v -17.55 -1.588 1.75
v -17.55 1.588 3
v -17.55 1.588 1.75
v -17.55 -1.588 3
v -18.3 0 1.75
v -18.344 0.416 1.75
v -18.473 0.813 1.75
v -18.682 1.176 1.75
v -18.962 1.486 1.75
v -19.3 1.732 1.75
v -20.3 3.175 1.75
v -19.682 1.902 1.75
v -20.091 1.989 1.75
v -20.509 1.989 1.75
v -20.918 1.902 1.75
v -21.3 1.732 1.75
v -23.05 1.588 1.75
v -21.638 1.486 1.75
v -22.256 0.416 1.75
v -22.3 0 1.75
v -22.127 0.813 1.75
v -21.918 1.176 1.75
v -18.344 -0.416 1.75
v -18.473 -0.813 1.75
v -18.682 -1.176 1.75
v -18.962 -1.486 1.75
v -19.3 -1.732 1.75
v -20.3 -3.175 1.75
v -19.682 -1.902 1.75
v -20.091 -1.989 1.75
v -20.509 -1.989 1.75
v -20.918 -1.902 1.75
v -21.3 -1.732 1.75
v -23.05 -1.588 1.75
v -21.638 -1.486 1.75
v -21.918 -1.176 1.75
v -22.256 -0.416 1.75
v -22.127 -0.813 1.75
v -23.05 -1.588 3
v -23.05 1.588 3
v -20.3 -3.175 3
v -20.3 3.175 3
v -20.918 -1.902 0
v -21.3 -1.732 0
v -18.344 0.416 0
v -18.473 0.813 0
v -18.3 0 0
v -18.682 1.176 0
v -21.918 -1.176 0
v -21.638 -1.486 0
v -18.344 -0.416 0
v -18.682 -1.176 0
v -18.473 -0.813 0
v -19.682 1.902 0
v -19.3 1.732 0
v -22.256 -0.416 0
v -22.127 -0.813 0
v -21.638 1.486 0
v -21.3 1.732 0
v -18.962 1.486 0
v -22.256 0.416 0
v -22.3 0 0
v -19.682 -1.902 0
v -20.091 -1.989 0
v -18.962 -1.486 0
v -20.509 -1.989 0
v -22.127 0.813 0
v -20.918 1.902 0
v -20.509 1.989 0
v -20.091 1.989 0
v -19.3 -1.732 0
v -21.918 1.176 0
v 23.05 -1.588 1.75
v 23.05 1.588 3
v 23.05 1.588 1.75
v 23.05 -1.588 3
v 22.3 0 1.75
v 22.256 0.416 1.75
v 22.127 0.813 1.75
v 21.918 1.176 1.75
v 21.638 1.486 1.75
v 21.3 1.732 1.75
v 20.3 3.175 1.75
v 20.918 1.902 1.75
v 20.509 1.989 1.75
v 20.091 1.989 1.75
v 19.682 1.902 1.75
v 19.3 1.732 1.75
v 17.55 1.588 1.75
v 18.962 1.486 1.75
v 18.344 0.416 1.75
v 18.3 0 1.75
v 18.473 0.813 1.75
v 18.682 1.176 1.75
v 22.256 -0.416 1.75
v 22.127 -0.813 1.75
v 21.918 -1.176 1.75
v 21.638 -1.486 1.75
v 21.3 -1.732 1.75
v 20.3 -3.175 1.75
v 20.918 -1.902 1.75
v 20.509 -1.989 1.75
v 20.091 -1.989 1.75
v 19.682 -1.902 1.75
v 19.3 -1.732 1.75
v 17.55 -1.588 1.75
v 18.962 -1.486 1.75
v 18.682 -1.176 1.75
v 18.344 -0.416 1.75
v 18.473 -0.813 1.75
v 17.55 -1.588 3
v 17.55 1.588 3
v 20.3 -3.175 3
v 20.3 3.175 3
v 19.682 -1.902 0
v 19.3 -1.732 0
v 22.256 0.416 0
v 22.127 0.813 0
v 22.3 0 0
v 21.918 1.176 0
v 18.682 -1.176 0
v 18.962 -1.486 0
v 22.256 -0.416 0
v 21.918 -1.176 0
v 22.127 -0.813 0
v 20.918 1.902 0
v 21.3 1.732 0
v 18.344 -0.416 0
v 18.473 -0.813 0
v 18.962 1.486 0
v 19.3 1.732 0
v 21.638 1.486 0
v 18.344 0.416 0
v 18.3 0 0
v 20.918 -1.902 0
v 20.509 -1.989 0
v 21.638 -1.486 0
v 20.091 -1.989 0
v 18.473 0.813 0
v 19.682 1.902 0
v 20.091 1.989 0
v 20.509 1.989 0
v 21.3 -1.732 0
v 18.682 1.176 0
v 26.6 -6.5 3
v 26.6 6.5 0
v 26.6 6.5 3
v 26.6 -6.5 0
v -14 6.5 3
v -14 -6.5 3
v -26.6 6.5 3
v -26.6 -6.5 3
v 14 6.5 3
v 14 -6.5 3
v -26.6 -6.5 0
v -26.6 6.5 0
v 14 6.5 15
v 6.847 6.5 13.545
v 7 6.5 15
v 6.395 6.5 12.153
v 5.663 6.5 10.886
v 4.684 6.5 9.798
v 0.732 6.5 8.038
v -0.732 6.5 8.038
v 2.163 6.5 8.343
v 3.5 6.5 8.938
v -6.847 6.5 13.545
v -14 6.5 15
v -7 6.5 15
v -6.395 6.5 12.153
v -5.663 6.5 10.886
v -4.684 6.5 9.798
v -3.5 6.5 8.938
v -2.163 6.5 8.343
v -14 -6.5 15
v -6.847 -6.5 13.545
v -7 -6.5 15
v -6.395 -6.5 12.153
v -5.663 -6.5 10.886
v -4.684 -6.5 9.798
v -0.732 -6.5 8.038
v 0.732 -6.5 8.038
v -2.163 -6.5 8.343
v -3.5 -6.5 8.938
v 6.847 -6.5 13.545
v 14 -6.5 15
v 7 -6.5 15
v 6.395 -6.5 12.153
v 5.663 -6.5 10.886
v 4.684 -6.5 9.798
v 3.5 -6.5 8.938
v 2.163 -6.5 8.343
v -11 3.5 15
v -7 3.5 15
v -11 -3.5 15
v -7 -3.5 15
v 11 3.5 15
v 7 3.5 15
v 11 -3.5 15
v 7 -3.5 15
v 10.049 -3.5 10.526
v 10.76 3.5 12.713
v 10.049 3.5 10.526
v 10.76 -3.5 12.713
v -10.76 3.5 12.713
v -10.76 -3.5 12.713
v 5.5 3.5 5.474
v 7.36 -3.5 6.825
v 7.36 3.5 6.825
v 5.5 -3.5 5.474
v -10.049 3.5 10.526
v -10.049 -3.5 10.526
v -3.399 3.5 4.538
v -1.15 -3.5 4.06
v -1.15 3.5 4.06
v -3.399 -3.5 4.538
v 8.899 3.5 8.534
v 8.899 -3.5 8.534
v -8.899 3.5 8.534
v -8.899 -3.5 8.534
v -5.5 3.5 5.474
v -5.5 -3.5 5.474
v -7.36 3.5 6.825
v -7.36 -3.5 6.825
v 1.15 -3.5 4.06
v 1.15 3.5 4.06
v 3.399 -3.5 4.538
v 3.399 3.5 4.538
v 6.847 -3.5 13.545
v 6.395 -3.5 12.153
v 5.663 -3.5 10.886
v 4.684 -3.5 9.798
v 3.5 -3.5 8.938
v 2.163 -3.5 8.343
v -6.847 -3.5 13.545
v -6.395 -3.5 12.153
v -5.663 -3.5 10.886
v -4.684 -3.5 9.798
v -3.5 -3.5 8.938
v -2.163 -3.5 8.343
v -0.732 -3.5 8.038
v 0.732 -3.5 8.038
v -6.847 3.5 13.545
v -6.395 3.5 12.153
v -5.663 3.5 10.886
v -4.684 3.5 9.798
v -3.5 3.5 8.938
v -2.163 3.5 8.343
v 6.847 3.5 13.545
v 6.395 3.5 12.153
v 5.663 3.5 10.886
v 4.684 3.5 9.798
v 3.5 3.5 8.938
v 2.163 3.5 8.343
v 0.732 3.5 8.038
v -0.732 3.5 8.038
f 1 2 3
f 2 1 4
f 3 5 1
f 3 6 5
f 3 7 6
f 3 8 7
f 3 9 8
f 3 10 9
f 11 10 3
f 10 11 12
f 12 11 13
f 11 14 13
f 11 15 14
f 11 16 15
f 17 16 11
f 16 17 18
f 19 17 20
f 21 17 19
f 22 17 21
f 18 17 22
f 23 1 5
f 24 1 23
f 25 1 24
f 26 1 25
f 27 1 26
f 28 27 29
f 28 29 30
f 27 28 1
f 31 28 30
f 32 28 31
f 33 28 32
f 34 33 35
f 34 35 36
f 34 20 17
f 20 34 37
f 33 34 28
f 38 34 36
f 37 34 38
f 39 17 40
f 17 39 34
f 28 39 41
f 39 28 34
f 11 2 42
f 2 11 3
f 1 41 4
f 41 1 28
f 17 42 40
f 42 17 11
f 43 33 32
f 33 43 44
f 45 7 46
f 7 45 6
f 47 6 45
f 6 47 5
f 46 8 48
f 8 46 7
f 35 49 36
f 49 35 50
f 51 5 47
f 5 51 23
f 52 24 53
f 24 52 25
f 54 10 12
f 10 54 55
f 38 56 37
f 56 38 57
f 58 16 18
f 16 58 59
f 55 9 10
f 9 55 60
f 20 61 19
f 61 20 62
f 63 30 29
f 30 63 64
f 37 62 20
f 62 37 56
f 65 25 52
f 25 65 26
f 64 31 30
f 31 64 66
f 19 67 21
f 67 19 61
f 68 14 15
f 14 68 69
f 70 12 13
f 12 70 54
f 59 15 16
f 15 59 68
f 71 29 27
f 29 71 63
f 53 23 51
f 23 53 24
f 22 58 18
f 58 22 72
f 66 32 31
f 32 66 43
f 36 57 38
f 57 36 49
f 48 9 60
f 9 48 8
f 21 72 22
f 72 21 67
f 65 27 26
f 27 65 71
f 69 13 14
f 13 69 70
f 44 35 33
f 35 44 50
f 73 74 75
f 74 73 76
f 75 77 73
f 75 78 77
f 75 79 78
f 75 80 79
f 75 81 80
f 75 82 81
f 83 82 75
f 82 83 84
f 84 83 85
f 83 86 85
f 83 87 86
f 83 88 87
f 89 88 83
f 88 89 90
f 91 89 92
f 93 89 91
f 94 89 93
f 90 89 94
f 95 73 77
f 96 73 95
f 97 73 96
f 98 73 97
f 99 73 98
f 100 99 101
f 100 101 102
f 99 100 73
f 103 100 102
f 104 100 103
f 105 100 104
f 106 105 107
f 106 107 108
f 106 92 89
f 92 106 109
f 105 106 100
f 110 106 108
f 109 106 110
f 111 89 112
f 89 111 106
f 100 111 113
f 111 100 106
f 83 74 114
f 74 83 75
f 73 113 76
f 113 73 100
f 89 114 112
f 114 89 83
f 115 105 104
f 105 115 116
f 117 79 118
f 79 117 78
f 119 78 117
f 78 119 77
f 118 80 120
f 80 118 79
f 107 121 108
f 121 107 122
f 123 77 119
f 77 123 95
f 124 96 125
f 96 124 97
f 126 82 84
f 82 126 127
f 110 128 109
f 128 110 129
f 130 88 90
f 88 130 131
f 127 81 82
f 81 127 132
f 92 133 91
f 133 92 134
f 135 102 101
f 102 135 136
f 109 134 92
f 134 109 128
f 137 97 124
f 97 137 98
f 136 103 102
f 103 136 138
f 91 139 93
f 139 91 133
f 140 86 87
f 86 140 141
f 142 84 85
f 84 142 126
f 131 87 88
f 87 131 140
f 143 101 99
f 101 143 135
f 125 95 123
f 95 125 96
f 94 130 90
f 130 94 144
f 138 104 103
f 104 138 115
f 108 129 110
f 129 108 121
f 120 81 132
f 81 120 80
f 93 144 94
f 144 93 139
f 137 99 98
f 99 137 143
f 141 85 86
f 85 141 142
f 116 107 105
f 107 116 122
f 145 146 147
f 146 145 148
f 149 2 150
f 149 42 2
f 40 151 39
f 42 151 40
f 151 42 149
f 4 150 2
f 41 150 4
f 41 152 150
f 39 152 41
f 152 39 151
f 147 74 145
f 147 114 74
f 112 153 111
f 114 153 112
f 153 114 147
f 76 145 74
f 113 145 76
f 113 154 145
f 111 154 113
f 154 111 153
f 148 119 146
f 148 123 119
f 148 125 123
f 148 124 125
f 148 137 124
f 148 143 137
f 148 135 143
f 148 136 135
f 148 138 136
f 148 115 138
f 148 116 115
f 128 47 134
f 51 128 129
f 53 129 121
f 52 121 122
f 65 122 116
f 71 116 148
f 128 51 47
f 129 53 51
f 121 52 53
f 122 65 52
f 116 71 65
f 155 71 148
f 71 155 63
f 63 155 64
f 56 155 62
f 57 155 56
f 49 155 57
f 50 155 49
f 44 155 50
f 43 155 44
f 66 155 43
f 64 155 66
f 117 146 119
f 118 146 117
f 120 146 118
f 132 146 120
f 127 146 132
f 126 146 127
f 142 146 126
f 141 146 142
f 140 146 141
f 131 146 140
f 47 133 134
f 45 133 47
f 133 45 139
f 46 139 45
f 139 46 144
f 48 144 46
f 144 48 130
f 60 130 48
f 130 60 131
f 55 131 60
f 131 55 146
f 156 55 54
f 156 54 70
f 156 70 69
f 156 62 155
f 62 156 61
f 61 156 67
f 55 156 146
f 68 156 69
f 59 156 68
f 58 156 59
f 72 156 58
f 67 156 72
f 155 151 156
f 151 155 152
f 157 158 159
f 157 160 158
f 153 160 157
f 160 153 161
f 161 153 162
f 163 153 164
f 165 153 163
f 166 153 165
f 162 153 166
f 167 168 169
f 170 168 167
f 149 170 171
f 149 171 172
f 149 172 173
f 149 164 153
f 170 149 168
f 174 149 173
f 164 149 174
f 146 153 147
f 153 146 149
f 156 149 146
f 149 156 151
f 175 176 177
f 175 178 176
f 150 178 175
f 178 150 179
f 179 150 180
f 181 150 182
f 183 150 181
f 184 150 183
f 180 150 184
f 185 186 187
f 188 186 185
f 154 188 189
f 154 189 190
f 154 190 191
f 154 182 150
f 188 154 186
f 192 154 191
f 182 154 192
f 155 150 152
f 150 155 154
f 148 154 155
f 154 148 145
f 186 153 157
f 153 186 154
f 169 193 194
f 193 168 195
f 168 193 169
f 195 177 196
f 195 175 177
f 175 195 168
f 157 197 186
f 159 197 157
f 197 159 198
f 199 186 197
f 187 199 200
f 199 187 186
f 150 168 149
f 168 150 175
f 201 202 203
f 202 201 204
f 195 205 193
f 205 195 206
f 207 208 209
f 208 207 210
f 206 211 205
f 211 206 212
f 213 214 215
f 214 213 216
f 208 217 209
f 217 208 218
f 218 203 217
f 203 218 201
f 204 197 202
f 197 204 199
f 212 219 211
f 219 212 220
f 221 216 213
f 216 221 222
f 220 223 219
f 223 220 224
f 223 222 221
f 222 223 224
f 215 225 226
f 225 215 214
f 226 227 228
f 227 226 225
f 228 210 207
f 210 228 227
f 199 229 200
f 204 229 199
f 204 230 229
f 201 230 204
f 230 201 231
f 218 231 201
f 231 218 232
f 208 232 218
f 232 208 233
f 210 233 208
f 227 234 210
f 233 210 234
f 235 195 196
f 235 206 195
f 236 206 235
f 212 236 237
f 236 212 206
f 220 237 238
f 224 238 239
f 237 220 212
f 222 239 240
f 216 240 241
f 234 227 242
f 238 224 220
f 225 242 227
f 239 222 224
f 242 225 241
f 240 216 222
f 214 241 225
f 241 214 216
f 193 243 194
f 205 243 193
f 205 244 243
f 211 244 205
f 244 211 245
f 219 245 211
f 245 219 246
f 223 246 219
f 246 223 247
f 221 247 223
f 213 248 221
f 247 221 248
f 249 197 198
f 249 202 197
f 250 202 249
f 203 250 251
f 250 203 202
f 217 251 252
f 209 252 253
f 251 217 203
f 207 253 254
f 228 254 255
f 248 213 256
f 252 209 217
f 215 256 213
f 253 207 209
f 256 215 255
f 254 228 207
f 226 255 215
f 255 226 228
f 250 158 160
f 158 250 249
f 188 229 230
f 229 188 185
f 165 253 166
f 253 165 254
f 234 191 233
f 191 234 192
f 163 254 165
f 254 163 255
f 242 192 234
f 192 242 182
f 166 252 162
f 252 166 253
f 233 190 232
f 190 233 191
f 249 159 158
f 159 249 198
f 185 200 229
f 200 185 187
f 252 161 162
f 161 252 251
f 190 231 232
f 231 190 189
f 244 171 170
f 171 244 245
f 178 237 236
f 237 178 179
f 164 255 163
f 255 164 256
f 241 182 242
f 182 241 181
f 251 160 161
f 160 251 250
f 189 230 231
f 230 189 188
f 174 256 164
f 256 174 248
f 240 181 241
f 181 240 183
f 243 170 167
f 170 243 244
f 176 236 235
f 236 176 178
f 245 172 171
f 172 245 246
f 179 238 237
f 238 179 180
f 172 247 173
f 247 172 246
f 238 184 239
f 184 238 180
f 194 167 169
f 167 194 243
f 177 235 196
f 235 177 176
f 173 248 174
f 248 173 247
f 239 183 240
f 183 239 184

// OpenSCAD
// file: common.scad
/*--------------------------------------------------------------------------*
* Sizes and common routines for the CNC parts
*---------------------------------------------------------------------------*
* 13-Jul-2014 ShaneG
*
* First set of definitions using the components I have to experiment with.
*--------------------------------------------------------------------------*/

//---------------------------------------------------------------------------
// Common definitions
//---------------------------------------------------------------------------

RESOLUTION  = 0.1; // Resolution of your printer

PANEL_DEPTH = 3.0; // The prefered size of any shell material

BOLT_SIZE = 4.2; // Diameter of connecting bolts (M4)

BED_TO_MOUNT = 15.0;

GUIDE_ROD_DIAMETER = 12.50;

BEARING_DIAMETER       = 22.00;
BEARING_INNER_DIAMETER = 14.00;
BEARING_HEIGHT         = 7.00;

//---------------------------------------------------------------------------
// Nuts
//---------------------------------------------------------------------------

/* Hex Nut
**
** Dimensios for a hex nut. The 'outer' diameter (ie: straight side to
** parallel straight side) of the nut does not seem very consistent -
** measurements indicate a 0.5mm range of error across nuts.
*/

NUT_OUTER_DIAMETER = 13.00;
NUT_INNER_DIAMETER = 8.50;  // Enough room for the bore and thread
NUT_HEIGHT         = 6;

NUT4_OUTER_DIAMETER = 5.5;
NUT4_INNER_DIAMETER = 4.0;
NUT4_HEIGHT         = 2.5;

/** Create a hexagon.
 *
 * The 'length' parameter specifies the distance from the center of the
 * hexagon to the center of one of the six straight edges. The 'depth'
 * parameter specifies the size in the Z axis. The resulting object
 * is centered on the origin.
 */
module hexagon(length, depth = 2) {
  width = 2 * length * tan(30);
  union() {
    cube(size = [ length * 2, width, depth ], center = true);
    rotate(a = [ 0, 0, 60 ]) {
      cube(size = [ length * 2, width, depth ], center = true);
      }
    rotate(a = [ 0, 0, -60 ]) {
      cube(size = [ length * 2, width, depth ], center = true);
      }
    }
  }

/** Create a hex nut object
 *
 * This function creates a hex nut (centered on the origin) that contains a
 * hole through the center.
 */
module hexnut(depth = NUT_HEIGHT) {
  difference() {
    hexagon(NUT_OUTER_DIAMETER / 2, depth);
    cylinder(h = 2 * depth, r = NUT_INNER_DIAMETER / 2, center = true, $fs = RESOLUTION);
    }
  }

/** Create a negative hex nut object
 *
 * This function creates a hex nut (centered on the origin) that can be subtracted
 * from another shape to allow a hole for the nut to fit into.
 */
module hexnut_negative(depth = NUT_HEIGHT, spindle = NUT_HEIGHT) {
  union() {
    hexagon(NUT_OUTER_DIAMETER / 2, depth);
    cylinder(h = max(2 * depth, spindle), r = NUT_INNER_DIAMETER / 2, center = true, $fs = RESOLUTION);
    }
  }

/** Create a negative hex nut object
 *
 * This function creates a hex nut (centered on the origin) that can be subtracted
 * from another shape to allow a hole for the nut to fit into.
 */
module hexnut4_negative(depth = NUT4_HEIGHT, spindle = NUT4_HEIGHT) {
  union() {
    hexagon(NUT4_OUTER_DIAMETER / 2, depth);
    cylinder(h = max(2 * depth, spindle), r = NUT4_INNER_DIAMETER / 2, center = true, $fs = RESOLUTION);
    }
  }
// main file
/*--------------------------------------------------------------------------*
* X dimension mount connectors
*---------------------------------------------------------------------------*
* 13-Jul-2014 ShaneG
*
* The connector in the X dimension
*--------------------------------------------------------------------------*/
include <common.scad>;

//--- Common definitions
STEM_WIDTH  = BEARING_DIAMETER + (2 * PANEL_DEPTH); // Width (in X) of the stem
STEM_HEIGHT = BEARING_HEIGHT + (2 * PANEL_DEPTH);   // Height (in Y) of the stem

//---------------------------------------------------------------------------
// Helper modules
//---------------------------------------------------------------------------

/** Create the base
 *
 * The base needs to provide enough space for two connecting bolts and a
 * stem. The resulting object is centered around the Z axis and vertical
 * based at Z = 0.
 */
module baseplate() {
  plate_width = STEM_WIDTH + (6 * BOLT_SIZE);
  plate_height = max(STEM_HEIGHT, 3 * BOLT_SIZE);
  difference() {
    // Create the base plate
    translate(v = [ 0, 0, PANEL_DEPTH / 2 ]) {
      cube(size = [ plate_width, plate_height, PANEL_DEPTH ], center = true);
      }
    // Cut holes for the bolts
    translate(v = [ -((plate_width / 2) - (1.5 * BOLT_SIZE)), 0, PANEL_DEPTH ]) {
      hexnut4_negative(spindle = 3 * PANEL_DEPTH);
      //cylinder(h = PANEL_DEPTH * 4, r = BOLT_SIZE / 2, center = true, $fs = RESOLUTION);
      }
    translate(v = [ (plate_width / 2) - (1.5 * BOLT_SIZE), 0, PANEL_DEPTH ]) {
      hexnut4_negative(spindle = 3 * PANEL_DEPTH);
      //cylinder(h = PANEL_DEPTH * 4, r = BOLT_SIZE / 2, center = true, $fs = RESOLUTION);
      }
    }
  }

/** Create the stem
 *
 * The stem is centered around the Z axis and vertically based at Z = 0. The
 * height of the stem is such that the center of the nut is BED_TO_MOUNT mm
 * from Z = 0.
 */
module stem() {
  difference() {
    translate(v = [ -STEM_WIDTH / 2, -STEM_HEIGHT / 2, 0 ]) {
      cube(size = [ STEM_WIDTH, STEM_HEIGHT, BED_TO_MOUNT ], center = false);
      }
    translate(v = [ 0, 0, BED_TO_MOUNT ]) {
      rotate(a = [ 90, 0, 0 ]) {
        cylinder(h = BEARING_HEIGHT, r = BEARING_DIAMETER / 2, center = true, $fs = RESOLUTION);
        }
      }
    translate(v = [ 0, 0, BED_TO_MOUNT ]) {
      rotate(a = [ 90, 0, 0 ]) {
        cylinder(h = 4 * BEARING_HEIGHT, r = BEARING_INNER_DIAMETER / 2, center = true, $fs = RESOLUTION);
        }
      }
    }
  }

//---------------------------------------------------------------------------
// Main shape
//---------------------------------------------------------------------------

union() {
  baseplate();
  stem();
  }
